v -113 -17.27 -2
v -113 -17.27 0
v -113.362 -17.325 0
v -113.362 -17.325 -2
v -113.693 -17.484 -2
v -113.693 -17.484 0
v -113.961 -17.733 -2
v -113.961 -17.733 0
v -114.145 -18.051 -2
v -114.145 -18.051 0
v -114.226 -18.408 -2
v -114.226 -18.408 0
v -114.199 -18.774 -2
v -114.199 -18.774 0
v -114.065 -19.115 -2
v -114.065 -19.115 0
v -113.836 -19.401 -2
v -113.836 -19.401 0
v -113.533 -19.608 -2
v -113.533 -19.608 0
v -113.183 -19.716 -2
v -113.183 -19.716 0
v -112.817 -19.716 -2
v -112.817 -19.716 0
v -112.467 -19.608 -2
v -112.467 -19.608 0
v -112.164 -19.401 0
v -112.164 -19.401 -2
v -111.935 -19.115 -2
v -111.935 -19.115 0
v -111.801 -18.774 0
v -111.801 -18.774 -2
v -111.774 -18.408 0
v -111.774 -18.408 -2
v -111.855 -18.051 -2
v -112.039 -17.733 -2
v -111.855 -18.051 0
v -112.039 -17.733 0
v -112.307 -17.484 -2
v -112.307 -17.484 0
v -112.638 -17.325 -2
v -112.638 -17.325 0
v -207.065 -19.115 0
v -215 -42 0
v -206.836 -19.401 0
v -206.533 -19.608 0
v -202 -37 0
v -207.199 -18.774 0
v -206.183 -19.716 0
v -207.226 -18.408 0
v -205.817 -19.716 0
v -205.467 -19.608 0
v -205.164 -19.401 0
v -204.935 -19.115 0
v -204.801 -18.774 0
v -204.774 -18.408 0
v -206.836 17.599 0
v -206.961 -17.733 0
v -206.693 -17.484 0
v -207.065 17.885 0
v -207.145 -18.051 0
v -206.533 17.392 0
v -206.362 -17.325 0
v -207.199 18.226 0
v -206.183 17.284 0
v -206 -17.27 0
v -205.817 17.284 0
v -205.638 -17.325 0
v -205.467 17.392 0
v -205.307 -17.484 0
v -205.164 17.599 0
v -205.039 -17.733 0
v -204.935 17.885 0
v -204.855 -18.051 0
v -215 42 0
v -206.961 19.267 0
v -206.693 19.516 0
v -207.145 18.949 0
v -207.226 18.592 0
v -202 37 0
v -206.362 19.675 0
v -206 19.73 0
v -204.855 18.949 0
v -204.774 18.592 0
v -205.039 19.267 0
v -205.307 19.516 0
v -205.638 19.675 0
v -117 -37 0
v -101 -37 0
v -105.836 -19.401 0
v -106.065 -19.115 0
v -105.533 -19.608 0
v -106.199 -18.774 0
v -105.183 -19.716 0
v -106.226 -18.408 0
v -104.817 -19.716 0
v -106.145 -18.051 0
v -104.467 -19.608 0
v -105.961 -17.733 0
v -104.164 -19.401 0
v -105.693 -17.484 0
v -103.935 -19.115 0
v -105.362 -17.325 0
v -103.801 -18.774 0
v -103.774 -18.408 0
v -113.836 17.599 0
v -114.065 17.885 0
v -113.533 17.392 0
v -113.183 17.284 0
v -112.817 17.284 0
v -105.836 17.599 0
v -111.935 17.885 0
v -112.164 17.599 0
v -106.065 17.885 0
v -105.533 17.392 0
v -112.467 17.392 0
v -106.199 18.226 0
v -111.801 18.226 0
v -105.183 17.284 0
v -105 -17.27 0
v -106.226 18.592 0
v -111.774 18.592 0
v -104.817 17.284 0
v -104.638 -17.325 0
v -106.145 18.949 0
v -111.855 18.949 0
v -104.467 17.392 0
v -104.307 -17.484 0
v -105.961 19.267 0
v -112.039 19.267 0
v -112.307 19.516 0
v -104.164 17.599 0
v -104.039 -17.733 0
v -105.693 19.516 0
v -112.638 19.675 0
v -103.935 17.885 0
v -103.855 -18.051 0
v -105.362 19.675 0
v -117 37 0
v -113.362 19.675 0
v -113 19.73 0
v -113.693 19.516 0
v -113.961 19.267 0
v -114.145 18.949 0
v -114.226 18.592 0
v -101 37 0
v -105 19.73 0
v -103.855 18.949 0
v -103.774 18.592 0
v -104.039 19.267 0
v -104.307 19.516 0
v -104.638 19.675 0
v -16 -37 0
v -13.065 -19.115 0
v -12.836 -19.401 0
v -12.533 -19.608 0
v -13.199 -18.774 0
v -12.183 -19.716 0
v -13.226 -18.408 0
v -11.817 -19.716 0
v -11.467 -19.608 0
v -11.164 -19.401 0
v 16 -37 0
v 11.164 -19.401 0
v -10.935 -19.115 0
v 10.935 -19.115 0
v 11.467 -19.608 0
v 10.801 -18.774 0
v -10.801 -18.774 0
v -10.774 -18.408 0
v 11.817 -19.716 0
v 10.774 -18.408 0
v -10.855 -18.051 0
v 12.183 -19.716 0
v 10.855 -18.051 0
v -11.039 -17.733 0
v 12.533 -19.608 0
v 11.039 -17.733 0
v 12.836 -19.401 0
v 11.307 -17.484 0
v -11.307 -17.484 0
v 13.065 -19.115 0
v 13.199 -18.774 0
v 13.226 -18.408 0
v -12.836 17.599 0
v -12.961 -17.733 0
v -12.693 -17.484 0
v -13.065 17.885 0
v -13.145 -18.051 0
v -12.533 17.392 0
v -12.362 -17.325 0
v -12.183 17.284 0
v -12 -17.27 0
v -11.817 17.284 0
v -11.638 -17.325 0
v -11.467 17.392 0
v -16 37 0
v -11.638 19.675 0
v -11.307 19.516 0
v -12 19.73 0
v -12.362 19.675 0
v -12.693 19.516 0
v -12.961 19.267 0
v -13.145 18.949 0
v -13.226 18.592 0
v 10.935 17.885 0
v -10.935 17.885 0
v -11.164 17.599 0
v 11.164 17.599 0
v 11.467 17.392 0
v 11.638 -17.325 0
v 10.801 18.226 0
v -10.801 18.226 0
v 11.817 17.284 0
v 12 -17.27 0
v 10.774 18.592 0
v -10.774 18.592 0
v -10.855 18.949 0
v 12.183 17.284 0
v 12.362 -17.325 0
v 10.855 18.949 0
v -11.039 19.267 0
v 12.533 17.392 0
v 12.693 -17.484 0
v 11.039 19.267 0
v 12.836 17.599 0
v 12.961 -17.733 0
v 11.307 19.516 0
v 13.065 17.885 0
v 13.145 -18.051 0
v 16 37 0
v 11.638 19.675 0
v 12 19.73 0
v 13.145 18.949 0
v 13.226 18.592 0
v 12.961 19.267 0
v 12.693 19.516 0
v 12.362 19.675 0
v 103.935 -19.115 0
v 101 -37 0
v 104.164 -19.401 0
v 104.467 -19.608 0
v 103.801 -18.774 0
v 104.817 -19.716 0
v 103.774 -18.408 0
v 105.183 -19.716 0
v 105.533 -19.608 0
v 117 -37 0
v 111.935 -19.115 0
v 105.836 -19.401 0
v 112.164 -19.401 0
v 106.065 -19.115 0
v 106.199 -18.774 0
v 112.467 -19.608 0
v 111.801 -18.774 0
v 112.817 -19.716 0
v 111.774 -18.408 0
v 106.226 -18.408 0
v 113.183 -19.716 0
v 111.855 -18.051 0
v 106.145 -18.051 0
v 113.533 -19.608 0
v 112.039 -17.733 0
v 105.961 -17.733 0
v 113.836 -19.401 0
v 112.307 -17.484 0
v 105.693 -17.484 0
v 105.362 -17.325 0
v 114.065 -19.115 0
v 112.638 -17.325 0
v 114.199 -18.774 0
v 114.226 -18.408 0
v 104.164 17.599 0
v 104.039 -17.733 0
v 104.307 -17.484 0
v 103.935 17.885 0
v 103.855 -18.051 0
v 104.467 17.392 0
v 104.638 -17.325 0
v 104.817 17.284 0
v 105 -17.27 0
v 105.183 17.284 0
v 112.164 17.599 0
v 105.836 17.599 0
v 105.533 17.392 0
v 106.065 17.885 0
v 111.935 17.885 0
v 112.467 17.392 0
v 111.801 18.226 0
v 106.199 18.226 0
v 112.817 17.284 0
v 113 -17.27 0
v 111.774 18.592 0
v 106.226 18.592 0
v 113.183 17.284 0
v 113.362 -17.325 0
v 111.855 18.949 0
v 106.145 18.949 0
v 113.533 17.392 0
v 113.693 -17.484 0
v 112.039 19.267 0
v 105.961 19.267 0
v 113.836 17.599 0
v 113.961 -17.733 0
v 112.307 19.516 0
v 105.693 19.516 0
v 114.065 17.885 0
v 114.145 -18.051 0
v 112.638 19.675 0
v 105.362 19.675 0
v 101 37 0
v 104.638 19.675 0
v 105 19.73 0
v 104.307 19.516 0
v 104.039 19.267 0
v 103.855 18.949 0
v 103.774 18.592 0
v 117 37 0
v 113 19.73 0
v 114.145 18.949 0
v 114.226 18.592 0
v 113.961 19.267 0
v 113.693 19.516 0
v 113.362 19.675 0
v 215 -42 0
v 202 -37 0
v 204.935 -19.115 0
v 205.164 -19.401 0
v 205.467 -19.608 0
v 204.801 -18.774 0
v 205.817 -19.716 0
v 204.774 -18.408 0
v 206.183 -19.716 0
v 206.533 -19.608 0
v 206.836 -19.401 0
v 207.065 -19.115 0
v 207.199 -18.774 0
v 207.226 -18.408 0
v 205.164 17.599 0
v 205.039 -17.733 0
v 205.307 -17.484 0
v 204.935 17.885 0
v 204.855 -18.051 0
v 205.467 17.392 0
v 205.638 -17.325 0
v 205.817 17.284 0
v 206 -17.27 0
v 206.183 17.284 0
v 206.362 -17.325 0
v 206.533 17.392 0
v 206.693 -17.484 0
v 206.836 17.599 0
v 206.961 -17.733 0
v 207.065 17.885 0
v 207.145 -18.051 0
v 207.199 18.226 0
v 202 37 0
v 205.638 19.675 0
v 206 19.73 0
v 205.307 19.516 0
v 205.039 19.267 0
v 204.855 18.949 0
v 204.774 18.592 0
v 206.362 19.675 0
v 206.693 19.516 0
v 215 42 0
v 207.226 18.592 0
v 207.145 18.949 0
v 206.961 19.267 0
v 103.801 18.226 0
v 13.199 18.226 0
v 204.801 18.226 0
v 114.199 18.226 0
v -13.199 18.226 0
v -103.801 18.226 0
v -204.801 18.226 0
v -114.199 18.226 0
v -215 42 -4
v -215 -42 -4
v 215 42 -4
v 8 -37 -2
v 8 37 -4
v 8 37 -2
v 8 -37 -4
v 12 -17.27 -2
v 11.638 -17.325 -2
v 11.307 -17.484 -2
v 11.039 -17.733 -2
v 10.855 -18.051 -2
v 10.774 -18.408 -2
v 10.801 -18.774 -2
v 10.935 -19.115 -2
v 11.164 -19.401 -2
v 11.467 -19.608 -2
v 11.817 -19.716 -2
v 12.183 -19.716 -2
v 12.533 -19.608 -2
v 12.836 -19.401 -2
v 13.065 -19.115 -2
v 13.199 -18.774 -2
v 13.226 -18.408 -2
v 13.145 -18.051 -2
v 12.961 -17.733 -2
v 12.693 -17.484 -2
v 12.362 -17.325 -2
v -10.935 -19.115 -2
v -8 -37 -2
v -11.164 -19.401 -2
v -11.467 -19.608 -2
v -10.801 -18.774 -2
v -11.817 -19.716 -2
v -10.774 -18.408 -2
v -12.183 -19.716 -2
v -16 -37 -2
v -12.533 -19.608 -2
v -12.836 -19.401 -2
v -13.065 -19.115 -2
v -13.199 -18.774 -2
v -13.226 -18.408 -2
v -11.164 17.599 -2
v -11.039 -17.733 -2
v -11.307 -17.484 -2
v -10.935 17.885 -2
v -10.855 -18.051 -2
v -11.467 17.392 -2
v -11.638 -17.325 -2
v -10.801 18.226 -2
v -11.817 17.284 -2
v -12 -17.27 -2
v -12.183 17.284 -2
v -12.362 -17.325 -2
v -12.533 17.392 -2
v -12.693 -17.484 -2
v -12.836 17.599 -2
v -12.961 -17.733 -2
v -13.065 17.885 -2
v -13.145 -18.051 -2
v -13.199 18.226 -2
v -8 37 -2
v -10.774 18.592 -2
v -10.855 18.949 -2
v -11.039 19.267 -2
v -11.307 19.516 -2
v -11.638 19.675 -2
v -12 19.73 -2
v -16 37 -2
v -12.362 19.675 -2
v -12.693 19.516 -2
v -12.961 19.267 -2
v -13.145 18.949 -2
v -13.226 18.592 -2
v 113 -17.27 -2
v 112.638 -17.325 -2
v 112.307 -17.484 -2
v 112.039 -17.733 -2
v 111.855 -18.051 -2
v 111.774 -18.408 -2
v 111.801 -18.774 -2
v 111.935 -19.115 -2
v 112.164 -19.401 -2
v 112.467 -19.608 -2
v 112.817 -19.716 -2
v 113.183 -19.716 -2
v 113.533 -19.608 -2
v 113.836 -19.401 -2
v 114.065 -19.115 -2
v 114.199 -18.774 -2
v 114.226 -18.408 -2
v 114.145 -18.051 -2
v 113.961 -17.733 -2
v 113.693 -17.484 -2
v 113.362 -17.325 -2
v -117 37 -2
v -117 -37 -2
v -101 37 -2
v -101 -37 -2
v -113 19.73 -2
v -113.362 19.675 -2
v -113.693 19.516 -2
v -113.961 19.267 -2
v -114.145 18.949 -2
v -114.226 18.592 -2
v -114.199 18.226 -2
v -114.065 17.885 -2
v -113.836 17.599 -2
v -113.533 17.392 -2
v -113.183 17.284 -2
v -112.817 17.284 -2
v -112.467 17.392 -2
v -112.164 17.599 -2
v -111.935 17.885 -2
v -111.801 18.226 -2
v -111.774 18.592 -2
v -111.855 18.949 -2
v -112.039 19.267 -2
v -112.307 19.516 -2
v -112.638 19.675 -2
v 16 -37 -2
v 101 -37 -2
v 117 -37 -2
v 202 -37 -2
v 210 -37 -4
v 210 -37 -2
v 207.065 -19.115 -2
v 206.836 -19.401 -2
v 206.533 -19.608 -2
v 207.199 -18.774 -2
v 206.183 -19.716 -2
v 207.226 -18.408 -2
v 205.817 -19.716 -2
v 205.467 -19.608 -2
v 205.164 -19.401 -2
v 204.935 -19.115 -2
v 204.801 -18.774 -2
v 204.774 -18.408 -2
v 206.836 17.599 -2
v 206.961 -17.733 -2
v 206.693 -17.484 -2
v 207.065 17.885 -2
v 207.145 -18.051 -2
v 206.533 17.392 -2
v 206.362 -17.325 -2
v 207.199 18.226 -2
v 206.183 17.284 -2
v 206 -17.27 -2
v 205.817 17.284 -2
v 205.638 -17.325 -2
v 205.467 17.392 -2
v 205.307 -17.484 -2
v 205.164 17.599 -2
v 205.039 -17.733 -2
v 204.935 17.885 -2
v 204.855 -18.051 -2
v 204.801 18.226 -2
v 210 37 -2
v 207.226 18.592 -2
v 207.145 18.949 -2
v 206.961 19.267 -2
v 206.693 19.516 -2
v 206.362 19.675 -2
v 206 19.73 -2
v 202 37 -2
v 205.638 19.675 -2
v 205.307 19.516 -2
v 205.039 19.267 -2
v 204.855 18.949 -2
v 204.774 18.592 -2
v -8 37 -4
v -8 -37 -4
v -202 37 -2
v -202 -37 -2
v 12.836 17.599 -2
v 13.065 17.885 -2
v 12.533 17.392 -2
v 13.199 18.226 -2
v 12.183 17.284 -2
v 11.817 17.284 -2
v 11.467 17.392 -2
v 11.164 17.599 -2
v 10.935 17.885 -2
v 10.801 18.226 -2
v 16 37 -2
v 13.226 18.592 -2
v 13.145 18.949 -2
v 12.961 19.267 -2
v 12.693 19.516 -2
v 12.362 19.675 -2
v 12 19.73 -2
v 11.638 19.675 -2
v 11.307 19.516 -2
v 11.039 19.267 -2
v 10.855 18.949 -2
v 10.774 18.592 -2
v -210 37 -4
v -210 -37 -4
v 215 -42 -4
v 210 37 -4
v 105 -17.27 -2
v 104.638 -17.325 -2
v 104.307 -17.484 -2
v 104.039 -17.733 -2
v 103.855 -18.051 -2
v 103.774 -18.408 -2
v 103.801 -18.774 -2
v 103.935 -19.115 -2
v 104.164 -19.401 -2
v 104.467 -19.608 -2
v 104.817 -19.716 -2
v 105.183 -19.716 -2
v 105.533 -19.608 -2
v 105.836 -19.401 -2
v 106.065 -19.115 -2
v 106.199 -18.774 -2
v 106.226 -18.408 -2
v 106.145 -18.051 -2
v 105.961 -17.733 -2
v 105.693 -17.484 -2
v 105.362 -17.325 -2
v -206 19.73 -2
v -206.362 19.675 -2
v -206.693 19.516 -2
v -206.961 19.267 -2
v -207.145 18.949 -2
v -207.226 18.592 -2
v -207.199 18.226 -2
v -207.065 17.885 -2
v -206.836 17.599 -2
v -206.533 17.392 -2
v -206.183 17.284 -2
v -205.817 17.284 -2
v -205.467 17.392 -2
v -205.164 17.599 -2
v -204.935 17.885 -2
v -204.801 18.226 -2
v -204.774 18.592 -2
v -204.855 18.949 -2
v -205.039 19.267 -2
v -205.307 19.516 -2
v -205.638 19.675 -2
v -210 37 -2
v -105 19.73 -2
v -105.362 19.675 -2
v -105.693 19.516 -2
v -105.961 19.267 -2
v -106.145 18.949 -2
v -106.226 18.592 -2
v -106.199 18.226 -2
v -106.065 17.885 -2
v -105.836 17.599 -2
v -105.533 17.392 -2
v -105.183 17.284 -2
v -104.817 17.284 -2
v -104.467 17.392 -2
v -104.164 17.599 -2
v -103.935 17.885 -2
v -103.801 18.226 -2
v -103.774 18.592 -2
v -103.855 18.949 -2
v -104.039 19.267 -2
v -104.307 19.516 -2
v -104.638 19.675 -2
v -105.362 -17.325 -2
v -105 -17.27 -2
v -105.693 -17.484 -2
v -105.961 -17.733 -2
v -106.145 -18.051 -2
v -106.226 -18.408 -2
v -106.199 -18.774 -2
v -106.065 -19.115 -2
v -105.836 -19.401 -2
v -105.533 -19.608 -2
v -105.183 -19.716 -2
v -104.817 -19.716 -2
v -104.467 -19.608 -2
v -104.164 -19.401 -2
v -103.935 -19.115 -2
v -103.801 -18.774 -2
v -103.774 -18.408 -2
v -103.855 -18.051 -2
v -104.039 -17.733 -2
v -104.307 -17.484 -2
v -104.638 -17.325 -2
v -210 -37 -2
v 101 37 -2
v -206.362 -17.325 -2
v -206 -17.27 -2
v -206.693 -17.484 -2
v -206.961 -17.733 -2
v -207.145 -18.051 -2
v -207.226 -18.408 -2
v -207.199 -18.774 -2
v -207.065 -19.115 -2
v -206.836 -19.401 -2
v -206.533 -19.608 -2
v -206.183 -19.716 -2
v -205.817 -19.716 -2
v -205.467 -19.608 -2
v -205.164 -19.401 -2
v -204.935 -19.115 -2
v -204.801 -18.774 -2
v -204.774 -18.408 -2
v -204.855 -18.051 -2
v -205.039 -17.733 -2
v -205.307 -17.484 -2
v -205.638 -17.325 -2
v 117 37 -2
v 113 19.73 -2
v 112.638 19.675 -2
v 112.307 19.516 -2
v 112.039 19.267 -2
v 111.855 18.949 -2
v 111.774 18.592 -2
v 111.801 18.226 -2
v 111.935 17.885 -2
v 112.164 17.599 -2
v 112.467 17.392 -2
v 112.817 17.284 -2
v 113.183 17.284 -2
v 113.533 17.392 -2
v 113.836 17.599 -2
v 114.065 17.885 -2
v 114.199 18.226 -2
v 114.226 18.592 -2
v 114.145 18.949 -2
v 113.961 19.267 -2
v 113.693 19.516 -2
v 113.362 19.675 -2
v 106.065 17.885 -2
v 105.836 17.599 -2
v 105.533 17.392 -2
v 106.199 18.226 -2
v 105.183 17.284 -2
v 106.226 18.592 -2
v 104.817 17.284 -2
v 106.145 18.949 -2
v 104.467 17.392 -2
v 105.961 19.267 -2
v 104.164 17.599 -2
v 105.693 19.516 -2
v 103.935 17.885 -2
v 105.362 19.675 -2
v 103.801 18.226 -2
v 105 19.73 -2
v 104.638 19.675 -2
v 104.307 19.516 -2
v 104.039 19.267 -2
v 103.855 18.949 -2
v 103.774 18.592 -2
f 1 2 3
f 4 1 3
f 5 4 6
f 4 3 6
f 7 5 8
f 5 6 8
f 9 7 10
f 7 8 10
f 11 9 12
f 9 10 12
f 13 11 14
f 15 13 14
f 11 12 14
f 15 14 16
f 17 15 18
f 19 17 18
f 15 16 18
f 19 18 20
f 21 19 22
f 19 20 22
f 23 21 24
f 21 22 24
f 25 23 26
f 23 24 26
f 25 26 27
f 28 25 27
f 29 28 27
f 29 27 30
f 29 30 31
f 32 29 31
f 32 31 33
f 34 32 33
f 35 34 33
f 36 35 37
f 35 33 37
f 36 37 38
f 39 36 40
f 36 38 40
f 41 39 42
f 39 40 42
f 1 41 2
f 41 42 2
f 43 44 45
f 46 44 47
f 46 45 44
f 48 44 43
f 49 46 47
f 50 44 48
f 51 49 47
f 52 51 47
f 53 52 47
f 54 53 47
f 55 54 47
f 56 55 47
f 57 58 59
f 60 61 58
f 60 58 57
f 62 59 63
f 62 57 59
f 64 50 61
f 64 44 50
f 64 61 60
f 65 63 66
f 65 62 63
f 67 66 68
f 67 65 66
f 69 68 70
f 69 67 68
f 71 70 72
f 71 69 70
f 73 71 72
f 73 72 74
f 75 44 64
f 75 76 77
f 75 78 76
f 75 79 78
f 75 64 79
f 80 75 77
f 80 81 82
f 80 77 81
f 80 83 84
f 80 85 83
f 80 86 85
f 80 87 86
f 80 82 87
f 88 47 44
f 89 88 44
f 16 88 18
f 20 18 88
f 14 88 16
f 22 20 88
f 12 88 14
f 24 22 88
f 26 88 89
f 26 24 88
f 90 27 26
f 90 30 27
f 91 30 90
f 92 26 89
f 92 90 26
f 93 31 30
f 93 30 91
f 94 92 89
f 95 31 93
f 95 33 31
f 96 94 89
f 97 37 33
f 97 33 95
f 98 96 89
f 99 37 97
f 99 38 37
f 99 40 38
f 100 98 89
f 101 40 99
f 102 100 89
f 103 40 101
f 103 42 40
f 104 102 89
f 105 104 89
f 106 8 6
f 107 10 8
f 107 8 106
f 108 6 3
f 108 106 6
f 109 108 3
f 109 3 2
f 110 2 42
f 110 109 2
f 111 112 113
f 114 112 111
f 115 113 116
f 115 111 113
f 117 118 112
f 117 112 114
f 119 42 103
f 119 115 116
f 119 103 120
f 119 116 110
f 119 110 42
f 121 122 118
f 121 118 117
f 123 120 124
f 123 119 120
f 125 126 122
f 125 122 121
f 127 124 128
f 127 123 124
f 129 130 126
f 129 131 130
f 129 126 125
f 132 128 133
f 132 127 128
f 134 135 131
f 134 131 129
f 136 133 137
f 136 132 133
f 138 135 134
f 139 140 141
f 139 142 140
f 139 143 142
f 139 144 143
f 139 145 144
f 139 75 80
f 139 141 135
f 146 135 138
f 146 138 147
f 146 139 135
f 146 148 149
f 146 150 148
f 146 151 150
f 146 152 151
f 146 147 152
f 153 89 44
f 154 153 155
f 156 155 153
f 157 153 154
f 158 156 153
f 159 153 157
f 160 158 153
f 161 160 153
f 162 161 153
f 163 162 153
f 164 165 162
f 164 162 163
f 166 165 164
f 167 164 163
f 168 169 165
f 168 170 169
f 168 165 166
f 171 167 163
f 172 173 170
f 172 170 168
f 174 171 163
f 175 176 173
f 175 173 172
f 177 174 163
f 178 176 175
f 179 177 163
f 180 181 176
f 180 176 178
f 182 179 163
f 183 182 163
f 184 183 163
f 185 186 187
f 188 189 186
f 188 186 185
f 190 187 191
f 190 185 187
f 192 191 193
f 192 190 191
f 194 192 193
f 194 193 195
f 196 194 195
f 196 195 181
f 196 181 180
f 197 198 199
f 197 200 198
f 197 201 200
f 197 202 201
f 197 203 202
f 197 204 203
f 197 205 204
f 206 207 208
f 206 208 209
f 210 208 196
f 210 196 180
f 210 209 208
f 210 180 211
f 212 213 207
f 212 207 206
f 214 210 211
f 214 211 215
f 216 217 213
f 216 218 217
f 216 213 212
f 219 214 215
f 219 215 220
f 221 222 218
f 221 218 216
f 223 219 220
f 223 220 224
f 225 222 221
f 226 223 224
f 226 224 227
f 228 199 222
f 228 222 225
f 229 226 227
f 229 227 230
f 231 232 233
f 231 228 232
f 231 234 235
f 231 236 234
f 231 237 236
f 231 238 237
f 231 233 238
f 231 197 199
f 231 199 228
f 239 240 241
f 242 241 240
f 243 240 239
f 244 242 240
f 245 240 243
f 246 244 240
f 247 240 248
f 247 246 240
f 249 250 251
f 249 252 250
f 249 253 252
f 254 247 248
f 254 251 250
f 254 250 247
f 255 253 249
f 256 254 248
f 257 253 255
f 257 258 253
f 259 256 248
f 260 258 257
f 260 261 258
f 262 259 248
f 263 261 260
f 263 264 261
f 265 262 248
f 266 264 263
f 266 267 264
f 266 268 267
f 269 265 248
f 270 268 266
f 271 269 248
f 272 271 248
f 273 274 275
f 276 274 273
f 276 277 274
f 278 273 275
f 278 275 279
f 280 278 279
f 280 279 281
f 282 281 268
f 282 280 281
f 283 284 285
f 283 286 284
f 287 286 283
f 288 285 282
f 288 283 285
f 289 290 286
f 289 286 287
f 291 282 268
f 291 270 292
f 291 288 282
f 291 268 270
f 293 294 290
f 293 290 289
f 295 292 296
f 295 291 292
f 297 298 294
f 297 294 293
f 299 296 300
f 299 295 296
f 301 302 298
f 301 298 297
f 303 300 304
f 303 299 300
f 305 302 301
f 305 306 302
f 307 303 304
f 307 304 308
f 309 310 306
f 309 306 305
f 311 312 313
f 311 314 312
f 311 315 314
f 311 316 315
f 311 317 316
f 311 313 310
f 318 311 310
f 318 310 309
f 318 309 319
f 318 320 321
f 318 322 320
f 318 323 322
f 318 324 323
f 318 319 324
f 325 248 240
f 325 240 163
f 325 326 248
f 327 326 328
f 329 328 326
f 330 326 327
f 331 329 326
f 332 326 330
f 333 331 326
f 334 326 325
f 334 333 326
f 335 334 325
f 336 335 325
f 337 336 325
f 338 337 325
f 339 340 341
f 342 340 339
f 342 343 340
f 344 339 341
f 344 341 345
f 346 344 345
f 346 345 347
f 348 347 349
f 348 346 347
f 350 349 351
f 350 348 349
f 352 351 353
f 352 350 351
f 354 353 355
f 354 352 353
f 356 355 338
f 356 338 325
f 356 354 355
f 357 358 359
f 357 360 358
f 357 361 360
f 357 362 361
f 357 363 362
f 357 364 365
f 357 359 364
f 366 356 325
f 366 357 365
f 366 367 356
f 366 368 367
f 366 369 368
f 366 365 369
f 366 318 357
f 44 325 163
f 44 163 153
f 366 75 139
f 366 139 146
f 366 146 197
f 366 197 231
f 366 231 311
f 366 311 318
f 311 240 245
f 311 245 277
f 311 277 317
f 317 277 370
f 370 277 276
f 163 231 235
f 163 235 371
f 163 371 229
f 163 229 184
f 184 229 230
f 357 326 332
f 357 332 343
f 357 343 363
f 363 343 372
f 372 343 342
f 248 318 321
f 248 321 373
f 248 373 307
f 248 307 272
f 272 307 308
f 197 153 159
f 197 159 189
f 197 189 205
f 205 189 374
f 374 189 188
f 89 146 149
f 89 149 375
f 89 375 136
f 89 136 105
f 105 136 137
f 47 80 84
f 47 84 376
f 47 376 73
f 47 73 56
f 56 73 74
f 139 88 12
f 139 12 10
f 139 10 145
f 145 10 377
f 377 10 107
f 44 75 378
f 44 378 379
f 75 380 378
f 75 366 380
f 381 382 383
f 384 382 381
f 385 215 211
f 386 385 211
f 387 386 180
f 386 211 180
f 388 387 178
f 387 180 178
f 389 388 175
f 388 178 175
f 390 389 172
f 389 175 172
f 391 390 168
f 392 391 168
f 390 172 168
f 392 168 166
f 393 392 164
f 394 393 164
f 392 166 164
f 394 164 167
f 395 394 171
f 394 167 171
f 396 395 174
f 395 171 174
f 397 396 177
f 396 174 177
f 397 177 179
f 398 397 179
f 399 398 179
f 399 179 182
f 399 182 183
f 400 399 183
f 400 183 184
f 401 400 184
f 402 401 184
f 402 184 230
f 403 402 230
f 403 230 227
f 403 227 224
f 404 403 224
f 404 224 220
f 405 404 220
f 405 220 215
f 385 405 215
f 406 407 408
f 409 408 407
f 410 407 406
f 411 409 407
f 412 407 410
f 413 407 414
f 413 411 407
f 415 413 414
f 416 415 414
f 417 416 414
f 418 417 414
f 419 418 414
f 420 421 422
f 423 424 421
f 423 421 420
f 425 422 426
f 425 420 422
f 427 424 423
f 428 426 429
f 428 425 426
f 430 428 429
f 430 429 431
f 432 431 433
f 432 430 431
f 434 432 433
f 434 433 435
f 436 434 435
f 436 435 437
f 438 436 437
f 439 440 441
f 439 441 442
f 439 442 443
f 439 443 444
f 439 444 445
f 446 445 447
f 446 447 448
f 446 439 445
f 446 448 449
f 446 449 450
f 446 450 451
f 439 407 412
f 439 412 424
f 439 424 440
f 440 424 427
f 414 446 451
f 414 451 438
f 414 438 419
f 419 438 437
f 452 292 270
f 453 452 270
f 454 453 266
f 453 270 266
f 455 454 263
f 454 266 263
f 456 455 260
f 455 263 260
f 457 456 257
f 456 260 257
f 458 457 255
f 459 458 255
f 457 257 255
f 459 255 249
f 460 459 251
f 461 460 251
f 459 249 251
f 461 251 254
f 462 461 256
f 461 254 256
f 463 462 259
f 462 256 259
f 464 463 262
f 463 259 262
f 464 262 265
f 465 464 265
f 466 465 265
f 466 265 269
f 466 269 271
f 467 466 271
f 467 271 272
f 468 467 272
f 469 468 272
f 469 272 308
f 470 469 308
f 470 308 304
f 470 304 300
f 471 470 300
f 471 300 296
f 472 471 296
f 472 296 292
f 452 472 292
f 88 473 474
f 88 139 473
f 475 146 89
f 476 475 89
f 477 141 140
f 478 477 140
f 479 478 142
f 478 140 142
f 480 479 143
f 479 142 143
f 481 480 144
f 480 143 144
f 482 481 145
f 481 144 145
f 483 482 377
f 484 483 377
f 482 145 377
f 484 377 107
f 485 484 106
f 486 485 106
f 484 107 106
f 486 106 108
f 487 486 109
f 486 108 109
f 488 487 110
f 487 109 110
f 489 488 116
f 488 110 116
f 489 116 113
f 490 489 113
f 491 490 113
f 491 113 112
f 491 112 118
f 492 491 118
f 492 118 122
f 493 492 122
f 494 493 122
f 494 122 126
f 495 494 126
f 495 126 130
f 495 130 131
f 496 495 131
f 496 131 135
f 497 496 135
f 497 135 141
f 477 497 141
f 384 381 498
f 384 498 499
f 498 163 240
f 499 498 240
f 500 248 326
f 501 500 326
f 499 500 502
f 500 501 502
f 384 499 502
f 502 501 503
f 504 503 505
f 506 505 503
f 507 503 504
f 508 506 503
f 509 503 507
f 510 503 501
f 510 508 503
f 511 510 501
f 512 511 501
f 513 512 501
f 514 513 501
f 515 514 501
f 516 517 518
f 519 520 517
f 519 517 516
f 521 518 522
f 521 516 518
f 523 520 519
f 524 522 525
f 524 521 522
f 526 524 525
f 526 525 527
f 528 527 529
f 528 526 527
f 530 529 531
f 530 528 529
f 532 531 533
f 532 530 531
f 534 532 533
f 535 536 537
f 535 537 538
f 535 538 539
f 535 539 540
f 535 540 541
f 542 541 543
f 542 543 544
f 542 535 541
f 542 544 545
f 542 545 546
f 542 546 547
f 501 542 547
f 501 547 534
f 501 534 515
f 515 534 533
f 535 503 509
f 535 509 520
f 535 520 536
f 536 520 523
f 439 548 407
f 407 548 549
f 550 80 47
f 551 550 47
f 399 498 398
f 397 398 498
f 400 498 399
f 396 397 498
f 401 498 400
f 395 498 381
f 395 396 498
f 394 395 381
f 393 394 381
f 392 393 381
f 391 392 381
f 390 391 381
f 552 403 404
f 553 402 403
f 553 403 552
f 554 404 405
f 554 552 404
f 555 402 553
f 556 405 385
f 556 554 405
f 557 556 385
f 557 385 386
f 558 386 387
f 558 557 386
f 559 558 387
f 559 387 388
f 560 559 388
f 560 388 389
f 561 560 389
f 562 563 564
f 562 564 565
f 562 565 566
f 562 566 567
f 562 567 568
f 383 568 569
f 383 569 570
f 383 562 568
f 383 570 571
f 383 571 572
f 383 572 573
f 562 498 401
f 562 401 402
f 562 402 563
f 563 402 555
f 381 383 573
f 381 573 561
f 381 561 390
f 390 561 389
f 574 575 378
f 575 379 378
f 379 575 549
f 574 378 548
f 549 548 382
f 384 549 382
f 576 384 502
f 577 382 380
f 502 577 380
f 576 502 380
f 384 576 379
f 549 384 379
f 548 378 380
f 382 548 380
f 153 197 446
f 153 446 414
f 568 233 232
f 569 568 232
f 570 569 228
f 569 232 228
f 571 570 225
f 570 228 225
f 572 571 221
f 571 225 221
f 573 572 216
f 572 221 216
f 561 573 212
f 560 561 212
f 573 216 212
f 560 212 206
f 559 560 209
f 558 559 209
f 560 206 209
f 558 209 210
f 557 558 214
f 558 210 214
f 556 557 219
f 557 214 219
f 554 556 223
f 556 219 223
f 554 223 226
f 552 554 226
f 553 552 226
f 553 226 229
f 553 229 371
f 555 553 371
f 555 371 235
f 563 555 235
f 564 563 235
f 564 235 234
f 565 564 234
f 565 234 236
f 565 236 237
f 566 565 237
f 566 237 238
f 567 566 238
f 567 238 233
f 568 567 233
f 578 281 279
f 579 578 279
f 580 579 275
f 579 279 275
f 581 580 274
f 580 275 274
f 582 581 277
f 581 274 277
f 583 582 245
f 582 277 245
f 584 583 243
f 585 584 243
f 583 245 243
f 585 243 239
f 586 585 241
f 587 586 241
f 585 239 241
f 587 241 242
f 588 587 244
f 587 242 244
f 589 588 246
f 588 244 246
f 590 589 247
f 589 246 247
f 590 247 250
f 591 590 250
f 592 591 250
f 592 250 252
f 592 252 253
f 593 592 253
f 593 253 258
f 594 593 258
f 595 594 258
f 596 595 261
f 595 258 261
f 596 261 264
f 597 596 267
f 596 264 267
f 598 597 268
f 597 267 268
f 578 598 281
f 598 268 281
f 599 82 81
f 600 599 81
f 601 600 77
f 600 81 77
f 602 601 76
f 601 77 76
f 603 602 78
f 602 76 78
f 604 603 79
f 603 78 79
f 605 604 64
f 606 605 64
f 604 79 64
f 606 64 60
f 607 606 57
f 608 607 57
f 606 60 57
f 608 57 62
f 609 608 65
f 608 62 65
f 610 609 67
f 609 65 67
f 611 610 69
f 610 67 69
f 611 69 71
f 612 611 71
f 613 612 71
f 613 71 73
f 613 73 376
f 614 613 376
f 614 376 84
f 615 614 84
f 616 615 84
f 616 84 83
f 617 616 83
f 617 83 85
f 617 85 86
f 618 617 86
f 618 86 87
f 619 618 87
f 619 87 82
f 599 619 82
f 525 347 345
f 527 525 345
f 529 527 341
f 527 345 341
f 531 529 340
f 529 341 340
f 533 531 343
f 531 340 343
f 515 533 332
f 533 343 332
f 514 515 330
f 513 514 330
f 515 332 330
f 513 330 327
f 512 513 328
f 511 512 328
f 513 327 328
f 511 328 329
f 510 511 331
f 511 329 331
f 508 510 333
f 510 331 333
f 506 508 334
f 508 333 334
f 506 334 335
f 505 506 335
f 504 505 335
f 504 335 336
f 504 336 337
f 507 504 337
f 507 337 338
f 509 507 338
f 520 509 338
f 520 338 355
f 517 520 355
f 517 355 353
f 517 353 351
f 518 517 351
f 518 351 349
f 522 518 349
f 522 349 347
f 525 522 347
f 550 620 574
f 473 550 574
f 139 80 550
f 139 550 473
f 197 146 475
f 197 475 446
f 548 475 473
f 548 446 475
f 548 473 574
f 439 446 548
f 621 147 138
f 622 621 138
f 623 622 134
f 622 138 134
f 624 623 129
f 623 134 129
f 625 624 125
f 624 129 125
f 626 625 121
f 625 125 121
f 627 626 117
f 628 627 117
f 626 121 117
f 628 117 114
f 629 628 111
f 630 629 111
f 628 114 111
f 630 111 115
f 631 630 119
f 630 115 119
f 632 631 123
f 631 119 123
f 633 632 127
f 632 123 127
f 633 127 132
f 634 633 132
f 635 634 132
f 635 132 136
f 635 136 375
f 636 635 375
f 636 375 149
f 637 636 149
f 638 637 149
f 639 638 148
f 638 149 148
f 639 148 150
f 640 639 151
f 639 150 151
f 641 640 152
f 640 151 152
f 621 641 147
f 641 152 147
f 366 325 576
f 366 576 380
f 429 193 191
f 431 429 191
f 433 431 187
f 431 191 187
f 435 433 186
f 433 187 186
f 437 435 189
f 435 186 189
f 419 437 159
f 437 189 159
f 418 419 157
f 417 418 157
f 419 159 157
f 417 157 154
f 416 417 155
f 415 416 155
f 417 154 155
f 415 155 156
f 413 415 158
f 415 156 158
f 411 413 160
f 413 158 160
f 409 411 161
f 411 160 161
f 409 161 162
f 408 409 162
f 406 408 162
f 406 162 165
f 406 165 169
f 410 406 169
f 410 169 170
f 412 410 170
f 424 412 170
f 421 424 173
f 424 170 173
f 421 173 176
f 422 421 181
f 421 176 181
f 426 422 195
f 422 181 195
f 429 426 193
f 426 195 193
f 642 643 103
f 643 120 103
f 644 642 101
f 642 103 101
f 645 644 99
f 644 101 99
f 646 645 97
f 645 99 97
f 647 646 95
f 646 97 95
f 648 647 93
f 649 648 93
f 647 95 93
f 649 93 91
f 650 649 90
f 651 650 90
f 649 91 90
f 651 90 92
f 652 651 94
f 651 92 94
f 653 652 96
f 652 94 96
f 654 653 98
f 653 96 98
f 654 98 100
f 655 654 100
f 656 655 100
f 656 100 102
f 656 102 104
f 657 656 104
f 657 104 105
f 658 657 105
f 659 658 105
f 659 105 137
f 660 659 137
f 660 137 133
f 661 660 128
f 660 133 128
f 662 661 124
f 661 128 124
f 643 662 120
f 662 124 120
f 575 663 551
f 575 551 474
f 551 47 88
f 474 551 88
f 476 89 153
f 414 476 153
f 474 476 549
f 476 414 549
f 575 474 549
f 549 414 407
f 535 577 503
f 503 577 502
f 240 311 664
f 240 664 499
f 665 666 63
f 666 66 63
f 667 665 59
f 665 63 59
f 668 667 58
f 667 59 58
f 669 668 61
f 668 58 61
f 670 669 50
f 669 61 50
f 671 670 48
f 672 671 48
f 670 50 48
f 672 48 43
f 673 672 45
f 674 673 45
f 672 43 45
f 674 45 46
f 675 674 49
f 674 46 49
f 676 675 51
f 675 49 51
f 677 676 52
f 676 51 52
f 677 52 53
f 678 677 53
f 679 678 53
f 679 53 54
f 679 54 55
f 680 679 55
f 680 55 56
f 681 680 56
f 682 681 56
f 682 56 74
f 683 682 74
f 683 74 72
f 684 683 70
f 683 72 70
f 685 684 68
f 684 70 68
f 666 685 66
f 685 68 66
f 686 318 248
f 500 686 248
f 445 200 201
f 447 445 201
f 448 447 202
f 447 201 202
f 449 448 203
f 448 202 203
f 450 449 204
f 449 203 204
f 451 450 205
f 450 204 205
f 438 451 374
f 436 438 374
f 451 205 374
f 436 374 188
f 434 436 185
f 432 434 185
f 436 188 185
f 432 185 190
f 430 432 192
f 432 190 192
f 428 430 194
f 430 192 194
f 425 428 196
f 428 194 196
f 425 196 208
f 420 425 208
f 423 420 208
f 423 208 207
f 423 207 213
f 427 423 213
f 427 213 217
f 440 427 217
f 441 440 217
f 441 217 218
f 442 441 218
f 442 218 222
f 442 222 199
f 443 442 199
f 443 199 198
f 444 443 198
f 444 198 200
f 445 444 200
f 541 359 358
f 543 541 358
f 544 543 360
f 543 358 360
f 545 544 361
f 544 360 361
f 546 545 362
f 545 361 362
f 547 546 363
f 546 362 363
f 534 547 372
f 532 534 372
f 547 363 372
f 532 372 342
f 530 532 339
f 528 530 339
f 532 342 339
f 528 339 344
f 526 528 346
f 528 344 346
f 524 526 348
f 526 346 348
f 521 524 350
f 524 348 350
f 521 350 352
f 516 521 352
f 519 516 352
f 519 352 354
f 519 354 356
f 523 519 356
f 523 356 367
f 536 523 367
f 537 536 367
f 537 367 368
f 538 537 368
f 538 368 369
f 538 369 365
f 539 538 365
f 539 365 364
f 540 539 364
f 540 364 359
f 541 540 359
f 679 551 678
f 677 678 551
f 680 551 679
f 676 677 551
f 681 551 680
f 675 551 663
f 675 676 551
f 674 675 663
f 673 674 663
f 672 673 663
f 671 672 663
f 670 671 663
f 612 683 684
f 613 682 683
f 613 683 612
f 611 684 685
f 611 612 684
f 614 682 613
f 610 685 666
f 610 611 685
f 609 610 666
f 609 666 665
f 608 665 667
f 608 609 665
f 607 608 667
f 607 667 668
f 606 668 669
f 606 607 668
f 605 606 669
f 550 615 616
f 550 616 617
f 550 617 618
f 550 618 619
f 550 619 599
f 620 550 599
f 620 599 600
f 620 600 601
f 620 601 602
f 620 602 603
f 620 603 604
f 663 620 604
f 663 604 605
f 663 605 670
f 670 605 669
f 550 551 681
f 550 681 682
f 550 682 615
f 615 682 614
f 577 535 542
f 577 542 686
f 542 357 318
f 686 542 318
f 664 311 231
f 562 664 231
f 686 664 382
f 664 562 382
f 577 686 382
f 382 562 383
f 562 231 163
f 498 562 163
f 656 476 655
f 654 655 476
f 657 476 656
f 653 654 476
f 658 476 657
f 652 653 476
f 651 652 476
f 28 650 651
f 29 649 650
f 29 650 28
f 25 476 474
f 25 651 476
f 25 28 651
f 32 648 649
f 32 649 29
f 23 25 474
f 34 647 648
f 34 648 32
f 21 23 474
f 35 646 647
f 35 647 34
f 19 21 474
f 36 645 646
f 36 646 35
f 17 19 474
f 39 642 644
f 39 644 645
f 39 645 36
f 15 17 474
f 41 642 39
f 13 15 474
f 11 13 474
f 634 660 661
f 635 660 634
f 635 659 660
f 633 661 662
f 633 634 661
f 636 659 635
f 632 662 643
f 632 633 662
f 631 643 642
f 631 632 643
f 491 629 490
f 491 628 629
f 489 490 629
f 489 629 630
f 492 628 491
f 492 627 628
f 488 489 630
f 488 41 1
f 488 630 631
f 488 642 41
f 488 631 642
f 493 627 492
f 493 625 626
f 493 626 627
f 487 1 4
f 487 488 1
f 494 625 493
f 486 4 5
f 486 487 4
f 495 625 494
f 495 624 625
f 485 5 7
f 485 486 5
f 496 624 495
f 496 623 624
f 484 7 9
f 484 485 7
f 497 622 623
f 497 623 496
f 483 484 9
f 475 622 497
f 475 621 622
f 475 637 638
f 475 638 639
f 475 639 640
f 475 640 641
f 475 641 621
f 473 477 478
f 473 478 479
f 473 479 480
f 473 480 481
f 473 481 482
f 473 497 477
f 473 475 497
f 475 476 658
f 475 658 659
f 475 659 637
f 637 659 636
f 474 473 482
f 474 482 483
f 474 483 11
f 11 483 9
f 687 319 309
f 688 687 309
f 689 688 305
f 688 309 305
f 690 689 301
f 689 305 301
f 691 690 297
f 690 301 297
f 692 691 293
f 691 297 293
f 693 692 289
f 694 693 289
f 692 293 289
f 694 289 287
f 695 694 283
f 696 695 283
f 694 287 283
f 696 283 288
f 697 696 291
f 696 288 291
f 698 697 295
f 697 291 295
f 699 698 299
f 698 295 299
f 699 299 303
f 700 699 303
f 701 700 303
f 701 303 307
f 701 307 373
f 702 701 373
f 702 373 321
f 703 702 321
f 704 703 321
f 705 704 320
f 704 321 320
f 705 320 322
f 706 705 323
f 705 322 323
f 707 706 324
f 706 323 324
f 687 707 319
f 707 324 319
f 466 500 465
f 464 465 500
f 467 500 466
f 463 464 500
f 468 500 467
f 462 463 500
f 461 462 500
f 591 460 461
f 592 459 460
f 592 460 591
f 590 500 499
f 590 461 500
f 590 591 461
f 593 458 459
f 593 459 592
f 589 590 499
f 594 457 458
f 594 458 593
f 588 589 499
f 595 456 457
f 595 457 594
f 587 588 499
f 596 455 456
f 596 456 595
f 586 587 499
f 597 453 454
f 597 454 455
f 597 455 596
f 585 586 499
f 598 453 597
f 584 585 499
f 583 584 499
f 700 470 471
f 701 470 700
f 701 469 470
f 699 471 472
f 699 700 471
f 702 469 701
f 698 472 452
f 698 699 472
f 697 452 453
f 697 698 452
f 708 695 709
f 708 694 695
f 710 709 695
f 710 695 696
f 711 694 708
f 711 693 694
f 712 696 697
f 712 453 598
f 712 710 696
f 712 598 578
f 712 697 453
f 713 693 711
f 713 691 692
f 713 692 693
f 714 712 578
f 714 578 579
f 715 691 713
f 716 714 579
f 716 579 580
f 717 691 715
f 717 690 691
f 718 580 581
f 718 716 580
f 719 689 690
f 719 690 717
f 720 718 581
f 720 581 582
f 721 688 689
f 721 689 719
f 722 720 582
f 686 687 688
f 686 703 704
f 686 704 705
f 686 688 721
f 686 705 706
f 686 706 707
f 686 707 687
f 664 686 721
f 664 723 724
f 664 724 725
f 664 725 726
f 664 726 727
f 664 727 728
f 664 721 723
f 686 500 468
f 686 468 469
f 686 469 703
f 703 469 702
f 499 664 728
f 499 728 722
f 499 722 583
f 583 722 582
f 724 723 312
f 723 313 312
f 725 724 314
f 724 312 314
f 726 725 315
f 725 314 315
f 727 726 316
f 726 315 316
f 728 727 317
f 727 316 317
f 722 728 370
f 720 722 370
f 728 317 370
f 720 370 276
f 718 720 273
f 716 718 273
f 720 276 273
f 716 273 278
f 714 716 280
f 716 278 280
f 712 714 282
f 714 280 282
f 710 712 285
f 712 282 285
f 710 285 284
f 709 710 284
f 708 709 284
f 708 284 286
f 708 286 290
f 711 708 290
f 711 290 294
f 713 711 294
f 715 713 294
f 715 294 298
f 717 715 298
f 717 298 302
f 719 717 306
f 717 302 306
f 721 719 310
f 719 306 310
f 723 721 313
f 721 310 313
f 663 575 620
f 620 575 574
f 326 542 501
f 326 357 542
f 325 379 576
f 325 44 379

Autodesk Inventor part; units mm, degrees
ref_plane "YZ Plane" through (0, 0, 0) normal (1, 0, 0) x (0, 1, 0)
ref_plane "XZ Plane" through (0, 0, 0) normal (0, 1, 0) x (-1, 0, 0)
ref_plane "XY Plane" through (0, 0, 0) normal (0, 0, 1) x (1, 0, 0)
sketch "Esboço1" plane through (0, 0, 0) normal (0, 0, 1) x (1, 0, 0)
  line L0 (-215, -42) -> (215, -42)
  line L1 (215, -42) -> (215, 42)
  line L2 (215, 42) -> (-215, 42)
  line L3 (-215, 42) -> (-215, -42)
  point P0 (0, 0)
  dimension "d2" = 430
  dimension "d4" = 84
  dimension "d6" = 215
  dimension "d7" = 42
extrude "Extrusão1" add sketch "Esboço1" against normal blind 4
sketch "Esboço3" plane through (0, 0, 0) normal (0, 0, 1) x (1, 0, 0)
  line L0 (-215, -42) -> (-215, 42) projected
  line L1 (215, -42) -> (-215, -42) projected
  line L2 (-215, 37) -> (215, 37) construction
  line L3 (-210, 42) -> (-210, -42) construction
  line L4 (210, 42) -> (210, -42) construction
  line L5 (-215, -37) -> (215, -37) construction
  line L6 (-8, 37) -> (-8, -37) construction
  line L7 (8, 37) -> (8, -37) construction
  line L8 (210, 37) -> (210, -37)
  line L9 (-202, 37) -> (-202, -37)
  line L10 (-16, 37) -> (-16, -37)
  line L11 (-117, 37) -> (-117, -37)
  line L12 (-101, 37) -> (-101, -37)
  line L13 (16, 37) -> (16, -37)
  line L14 (202, 37) -> (202, -37)
  line L15 (101, 37) -> (101, -37)
  line L16 (117, 37) -> (117, -37)
  line L17 (-202, -37) -> (-117, -37)
  line L18 (-202, 37) -> (-117, 37)
  line L19 (-101, 37) -> (-16, 37)
  line L20 (-16, -37) -> (-101, -37)
  line L21 (202, 37) -> (117, 37)
  line L22 (101, 37) -> (16, 37)
  line L23 (-215, 42) -> (215, 42) projected
  line L24 (16, -37) -> (101, -37)
  line L25 (117, -37) -> (202, -37)
  point P0 (0, 0)
  dimension "d79" = 79
  dimension "d80" = 5
  dimension "d81" = 79
  dimension "d82" = 5
  dimension "d83" = 79
  dimension "d84" = 5
  dimension "d85" = 79
  dimension "d86" = 5
  dimension "d87" = 199
  dimension "d88" = 114
  dimension "d89" = 98
  dimension "d90" = 13
  dimension "d91" = 79
  dimension "d92" = 5
  dimension "d93" = 425
  dimension "d94" = 417
  dimension "d95" = 332
  dimension "d96" = 316
  dimension "d97" = 231
  dimension "d98" = 223
  dimension "d99" = 207
  dimension "d100" = 5
  dimension "d101" = 430
  dimension "d102" = 430
  dimension "d103" = 84
  dimension "d104" = 84
extrude "Extrusão2" cut sketch "Esboço3" against normal blind 10
sketch "Esboço5" plane through (0, 0, -4) normal (0, 0, -1) x (-1, 0, 0)
  line L0 (-215, 37) -> (215, 37) construction
  line L1 (-210, 42) -> (-210, -42) construction
  line L2 (210, 42) -> (210, -42) construction
  line L3 (-215, -37) -> (215, -37) construction
  line L4 (-8, 37) -> (-8, -37) construction
  line L5 (8, 37) -> (8, -37) construction
  line L6 (-117, -37) -> (-202, -37)
  line L7 (-202, -37) -> (-210, -37)
  line L8 (-210, 37) -> (-210, -37)
  line L9 (-210, 37) -> (-202, 37)
  line L10 (-202, 37) -> (-117, 37)
  line L11 (-202, 37) -> (-202, -37)
  line L12 (-101, 37) -> (-16, 37)
  line L13 (-117, 37) -> (-101, 37)
  line L14 (-101, -37) -> (-101, 37)
  line L15 (-101, 37) -> (-101, -37)
  line L16 (-101, -37) -> (-117, -37)
  line L17 (-117, 37) -> (-117, -37)
  line L18 (-16, 37) -> (-8, 37)
  line L19 (-8, 37) -> (-8, -37)
  line L20 (-8, -37) -> (-16, -37)
  line L21 (-16, 37) -> (-16, -37)
  line L22 (-16, -37) -> (-16, 37)
  line L23 (16, 37) -> (101, 37)
  line L24 (8, 37) -> (16, 37)
  line L25 (16, -37) -> (16, 37)
  line L26 (16, 37) -> (16, -37)
  line L27 (16, -37) -> (8, -37)
  line L28 (8, 37) -> (8, -37)
  line L29 (101, 37) -> (101, -37)
  line L30 (101, 37) -> (117, 37)
  line L31 (117, -37) -> (117, 37)
  line L32 (117, 37) -> (117, -37)
  line L33 (117, -37) -> (101, -37)
  line L34 (101, -37) -> (101, 37)
  line L35 (117, 37) -> (202, 37)
  line L36 (202, 37) -> (210, 37)
  line L37 (210, -37) -> (210, 37)
  line L38 (202, -37) -> (117, -37)
  line L39 (202, 37) -> (202, -37)
  line L40 (202, -37) -> (210, -37)
  point P0 (0, 0)
  point P1 (0, 0)
  point P2 (0, 0)
  dimension "d188" = 109
  dimension "d189" = 109
  dimension "d190" = 125
  dimension "d191" = 327
  dimension "d192" = 98
  dimension "d193" = 98
  dimension "d194" = 79
  dimension "d195" = 5
  dimension "d196" = 37
  dimension "d197" = 117
  dimension "d198" = 79
  dimension "d199" = 5
  dimension "d200" = 332
  dimension "d201" = 332
  dimension "d202" = 90
  dimension "d203" = 90
  dimension "d204" = 90
  dimension "d205" = 90
  dimension "d206" = 8
  dimension "d207" = 93
  dimension "d208" = 194
  dimension "d209" = 226
  dimension "d210" = 311
  dimension "d211" = 327
  dimension "d212" = 412
  dimension "d213" = 74
  dimension "d214" = 210
  dimension "d215" = 37
  dimension "d216" = 74
  dimension "d217" = 210
  dimension "d218" = 37
extrude "Extrusão4" cut sketch "Esboço5" against normal blind 2
sketch "Esboço6" plane through (0, 0, -2) normal (0, 0, -1) x (-1, 0, 0)
  line L0 (-210, 37) -> (-202, 37) projected
  line L1 (-210, 37) -> (-8, 37) projected
  line L2 (-210, -37) -> (-210, 37) projected
  line L3 (-210, 18.5) -> (210, 18.5) construction
  line L4 (210, 37) -> (210, -37) projected
  line L5 (-210, -18.5) -> (210, -18.5) construction
  line L6 (-117, 37) -> (-101, 37) projected
  line L7 (-206, 37) -> (-206, -37) construction
  line L8 (-113, 37) -> (-113, -37) construction
  line L9 (-105, 37) -> (-105, -37) construction
  line L10 (8, 37) -> (16, 37) projected
  line L11 (12, 37) -> (12, -37) construction
  line L12 (-16, 37) -> (-8, 37) projected
  line L13 (-12, 37) -> (-12, -37) construction
  line L14 (-8, -37) -> (-16, -37) projected
  line L15 (101, 37) -> (117, 37) projected
  line L16 (105, 37) -> (105, -37) construction
  line L17 (113, 37) -> (113, -37) construction
  line L18 (202, 37) -> (210, 37) projected
  line L19 (206, 37) -> (206, -37) construction
  line L20 (210, -37) -> (8, -37) projected
  point P0 (0, 0)
  point P1 (-206, 18.5)
  point P2 (-206, -18.5)
  point P3 (-113, -18.5)
  point P4 (-105, -18.5)
  point P5 (-113, 18.5)
  point P6 (-105, 18.5)
  point P7 (-12, 18.5)
  point P8 (-12, -18.5)
  point P9 (12, -18.5)
  point P10 (12, 18.5)
  point P11 (105, 18.5)
  point P12 (113, 18.5)
  point P13 (113, -18.5)
  point P14 (105, -18.5)
  point P15 (206, 18.5)
  point P16 (206, -18.5)
  dimension "d230" = 18.5
  dimension "d231" = 55.5
  dimension "d232" = 97
  dimension "d233" = 105
  dimension "d234" = 315
  dimension "d235" = 323
  dimension "d236" = 416
  dimension "d237" = 0
  dimension "d238" = 0
  dimension "d239" = 0
  dimension "d240" = 0
  dimension "d241" = 74
  dimension "d242" = 0
hole "Furo1" at (206, 18.5, -2) at (206, -18.5, -2) at (113, -18.5, -2) at (105, -18.5, -2) at (113, 18.5, -2) at (105, 18.5, -2) at (12, 18.5, -2) at (12, -18.5, -2) at (-12, -18.5, -2) at (-12, 18.5, -2) at (-105, 18.5, -2) at (-113, 18.5, -2) at (-113, -18.5, -2) at (-105, -18.5, -2) at (-206, 18.5, -2) at (-206, -18.5, -2) direction (0, 0, 1) diameter 2.459 end through all thread size "M3x0.5" class "6H" standard "ANSI Metric M Profile"
equation "\"d2\" = 2 * d6"
equation "\"d4\" = 2 * d7"
properties part number "Ra-Manager_Painel_Traseiro" material "Aço, carbono"
